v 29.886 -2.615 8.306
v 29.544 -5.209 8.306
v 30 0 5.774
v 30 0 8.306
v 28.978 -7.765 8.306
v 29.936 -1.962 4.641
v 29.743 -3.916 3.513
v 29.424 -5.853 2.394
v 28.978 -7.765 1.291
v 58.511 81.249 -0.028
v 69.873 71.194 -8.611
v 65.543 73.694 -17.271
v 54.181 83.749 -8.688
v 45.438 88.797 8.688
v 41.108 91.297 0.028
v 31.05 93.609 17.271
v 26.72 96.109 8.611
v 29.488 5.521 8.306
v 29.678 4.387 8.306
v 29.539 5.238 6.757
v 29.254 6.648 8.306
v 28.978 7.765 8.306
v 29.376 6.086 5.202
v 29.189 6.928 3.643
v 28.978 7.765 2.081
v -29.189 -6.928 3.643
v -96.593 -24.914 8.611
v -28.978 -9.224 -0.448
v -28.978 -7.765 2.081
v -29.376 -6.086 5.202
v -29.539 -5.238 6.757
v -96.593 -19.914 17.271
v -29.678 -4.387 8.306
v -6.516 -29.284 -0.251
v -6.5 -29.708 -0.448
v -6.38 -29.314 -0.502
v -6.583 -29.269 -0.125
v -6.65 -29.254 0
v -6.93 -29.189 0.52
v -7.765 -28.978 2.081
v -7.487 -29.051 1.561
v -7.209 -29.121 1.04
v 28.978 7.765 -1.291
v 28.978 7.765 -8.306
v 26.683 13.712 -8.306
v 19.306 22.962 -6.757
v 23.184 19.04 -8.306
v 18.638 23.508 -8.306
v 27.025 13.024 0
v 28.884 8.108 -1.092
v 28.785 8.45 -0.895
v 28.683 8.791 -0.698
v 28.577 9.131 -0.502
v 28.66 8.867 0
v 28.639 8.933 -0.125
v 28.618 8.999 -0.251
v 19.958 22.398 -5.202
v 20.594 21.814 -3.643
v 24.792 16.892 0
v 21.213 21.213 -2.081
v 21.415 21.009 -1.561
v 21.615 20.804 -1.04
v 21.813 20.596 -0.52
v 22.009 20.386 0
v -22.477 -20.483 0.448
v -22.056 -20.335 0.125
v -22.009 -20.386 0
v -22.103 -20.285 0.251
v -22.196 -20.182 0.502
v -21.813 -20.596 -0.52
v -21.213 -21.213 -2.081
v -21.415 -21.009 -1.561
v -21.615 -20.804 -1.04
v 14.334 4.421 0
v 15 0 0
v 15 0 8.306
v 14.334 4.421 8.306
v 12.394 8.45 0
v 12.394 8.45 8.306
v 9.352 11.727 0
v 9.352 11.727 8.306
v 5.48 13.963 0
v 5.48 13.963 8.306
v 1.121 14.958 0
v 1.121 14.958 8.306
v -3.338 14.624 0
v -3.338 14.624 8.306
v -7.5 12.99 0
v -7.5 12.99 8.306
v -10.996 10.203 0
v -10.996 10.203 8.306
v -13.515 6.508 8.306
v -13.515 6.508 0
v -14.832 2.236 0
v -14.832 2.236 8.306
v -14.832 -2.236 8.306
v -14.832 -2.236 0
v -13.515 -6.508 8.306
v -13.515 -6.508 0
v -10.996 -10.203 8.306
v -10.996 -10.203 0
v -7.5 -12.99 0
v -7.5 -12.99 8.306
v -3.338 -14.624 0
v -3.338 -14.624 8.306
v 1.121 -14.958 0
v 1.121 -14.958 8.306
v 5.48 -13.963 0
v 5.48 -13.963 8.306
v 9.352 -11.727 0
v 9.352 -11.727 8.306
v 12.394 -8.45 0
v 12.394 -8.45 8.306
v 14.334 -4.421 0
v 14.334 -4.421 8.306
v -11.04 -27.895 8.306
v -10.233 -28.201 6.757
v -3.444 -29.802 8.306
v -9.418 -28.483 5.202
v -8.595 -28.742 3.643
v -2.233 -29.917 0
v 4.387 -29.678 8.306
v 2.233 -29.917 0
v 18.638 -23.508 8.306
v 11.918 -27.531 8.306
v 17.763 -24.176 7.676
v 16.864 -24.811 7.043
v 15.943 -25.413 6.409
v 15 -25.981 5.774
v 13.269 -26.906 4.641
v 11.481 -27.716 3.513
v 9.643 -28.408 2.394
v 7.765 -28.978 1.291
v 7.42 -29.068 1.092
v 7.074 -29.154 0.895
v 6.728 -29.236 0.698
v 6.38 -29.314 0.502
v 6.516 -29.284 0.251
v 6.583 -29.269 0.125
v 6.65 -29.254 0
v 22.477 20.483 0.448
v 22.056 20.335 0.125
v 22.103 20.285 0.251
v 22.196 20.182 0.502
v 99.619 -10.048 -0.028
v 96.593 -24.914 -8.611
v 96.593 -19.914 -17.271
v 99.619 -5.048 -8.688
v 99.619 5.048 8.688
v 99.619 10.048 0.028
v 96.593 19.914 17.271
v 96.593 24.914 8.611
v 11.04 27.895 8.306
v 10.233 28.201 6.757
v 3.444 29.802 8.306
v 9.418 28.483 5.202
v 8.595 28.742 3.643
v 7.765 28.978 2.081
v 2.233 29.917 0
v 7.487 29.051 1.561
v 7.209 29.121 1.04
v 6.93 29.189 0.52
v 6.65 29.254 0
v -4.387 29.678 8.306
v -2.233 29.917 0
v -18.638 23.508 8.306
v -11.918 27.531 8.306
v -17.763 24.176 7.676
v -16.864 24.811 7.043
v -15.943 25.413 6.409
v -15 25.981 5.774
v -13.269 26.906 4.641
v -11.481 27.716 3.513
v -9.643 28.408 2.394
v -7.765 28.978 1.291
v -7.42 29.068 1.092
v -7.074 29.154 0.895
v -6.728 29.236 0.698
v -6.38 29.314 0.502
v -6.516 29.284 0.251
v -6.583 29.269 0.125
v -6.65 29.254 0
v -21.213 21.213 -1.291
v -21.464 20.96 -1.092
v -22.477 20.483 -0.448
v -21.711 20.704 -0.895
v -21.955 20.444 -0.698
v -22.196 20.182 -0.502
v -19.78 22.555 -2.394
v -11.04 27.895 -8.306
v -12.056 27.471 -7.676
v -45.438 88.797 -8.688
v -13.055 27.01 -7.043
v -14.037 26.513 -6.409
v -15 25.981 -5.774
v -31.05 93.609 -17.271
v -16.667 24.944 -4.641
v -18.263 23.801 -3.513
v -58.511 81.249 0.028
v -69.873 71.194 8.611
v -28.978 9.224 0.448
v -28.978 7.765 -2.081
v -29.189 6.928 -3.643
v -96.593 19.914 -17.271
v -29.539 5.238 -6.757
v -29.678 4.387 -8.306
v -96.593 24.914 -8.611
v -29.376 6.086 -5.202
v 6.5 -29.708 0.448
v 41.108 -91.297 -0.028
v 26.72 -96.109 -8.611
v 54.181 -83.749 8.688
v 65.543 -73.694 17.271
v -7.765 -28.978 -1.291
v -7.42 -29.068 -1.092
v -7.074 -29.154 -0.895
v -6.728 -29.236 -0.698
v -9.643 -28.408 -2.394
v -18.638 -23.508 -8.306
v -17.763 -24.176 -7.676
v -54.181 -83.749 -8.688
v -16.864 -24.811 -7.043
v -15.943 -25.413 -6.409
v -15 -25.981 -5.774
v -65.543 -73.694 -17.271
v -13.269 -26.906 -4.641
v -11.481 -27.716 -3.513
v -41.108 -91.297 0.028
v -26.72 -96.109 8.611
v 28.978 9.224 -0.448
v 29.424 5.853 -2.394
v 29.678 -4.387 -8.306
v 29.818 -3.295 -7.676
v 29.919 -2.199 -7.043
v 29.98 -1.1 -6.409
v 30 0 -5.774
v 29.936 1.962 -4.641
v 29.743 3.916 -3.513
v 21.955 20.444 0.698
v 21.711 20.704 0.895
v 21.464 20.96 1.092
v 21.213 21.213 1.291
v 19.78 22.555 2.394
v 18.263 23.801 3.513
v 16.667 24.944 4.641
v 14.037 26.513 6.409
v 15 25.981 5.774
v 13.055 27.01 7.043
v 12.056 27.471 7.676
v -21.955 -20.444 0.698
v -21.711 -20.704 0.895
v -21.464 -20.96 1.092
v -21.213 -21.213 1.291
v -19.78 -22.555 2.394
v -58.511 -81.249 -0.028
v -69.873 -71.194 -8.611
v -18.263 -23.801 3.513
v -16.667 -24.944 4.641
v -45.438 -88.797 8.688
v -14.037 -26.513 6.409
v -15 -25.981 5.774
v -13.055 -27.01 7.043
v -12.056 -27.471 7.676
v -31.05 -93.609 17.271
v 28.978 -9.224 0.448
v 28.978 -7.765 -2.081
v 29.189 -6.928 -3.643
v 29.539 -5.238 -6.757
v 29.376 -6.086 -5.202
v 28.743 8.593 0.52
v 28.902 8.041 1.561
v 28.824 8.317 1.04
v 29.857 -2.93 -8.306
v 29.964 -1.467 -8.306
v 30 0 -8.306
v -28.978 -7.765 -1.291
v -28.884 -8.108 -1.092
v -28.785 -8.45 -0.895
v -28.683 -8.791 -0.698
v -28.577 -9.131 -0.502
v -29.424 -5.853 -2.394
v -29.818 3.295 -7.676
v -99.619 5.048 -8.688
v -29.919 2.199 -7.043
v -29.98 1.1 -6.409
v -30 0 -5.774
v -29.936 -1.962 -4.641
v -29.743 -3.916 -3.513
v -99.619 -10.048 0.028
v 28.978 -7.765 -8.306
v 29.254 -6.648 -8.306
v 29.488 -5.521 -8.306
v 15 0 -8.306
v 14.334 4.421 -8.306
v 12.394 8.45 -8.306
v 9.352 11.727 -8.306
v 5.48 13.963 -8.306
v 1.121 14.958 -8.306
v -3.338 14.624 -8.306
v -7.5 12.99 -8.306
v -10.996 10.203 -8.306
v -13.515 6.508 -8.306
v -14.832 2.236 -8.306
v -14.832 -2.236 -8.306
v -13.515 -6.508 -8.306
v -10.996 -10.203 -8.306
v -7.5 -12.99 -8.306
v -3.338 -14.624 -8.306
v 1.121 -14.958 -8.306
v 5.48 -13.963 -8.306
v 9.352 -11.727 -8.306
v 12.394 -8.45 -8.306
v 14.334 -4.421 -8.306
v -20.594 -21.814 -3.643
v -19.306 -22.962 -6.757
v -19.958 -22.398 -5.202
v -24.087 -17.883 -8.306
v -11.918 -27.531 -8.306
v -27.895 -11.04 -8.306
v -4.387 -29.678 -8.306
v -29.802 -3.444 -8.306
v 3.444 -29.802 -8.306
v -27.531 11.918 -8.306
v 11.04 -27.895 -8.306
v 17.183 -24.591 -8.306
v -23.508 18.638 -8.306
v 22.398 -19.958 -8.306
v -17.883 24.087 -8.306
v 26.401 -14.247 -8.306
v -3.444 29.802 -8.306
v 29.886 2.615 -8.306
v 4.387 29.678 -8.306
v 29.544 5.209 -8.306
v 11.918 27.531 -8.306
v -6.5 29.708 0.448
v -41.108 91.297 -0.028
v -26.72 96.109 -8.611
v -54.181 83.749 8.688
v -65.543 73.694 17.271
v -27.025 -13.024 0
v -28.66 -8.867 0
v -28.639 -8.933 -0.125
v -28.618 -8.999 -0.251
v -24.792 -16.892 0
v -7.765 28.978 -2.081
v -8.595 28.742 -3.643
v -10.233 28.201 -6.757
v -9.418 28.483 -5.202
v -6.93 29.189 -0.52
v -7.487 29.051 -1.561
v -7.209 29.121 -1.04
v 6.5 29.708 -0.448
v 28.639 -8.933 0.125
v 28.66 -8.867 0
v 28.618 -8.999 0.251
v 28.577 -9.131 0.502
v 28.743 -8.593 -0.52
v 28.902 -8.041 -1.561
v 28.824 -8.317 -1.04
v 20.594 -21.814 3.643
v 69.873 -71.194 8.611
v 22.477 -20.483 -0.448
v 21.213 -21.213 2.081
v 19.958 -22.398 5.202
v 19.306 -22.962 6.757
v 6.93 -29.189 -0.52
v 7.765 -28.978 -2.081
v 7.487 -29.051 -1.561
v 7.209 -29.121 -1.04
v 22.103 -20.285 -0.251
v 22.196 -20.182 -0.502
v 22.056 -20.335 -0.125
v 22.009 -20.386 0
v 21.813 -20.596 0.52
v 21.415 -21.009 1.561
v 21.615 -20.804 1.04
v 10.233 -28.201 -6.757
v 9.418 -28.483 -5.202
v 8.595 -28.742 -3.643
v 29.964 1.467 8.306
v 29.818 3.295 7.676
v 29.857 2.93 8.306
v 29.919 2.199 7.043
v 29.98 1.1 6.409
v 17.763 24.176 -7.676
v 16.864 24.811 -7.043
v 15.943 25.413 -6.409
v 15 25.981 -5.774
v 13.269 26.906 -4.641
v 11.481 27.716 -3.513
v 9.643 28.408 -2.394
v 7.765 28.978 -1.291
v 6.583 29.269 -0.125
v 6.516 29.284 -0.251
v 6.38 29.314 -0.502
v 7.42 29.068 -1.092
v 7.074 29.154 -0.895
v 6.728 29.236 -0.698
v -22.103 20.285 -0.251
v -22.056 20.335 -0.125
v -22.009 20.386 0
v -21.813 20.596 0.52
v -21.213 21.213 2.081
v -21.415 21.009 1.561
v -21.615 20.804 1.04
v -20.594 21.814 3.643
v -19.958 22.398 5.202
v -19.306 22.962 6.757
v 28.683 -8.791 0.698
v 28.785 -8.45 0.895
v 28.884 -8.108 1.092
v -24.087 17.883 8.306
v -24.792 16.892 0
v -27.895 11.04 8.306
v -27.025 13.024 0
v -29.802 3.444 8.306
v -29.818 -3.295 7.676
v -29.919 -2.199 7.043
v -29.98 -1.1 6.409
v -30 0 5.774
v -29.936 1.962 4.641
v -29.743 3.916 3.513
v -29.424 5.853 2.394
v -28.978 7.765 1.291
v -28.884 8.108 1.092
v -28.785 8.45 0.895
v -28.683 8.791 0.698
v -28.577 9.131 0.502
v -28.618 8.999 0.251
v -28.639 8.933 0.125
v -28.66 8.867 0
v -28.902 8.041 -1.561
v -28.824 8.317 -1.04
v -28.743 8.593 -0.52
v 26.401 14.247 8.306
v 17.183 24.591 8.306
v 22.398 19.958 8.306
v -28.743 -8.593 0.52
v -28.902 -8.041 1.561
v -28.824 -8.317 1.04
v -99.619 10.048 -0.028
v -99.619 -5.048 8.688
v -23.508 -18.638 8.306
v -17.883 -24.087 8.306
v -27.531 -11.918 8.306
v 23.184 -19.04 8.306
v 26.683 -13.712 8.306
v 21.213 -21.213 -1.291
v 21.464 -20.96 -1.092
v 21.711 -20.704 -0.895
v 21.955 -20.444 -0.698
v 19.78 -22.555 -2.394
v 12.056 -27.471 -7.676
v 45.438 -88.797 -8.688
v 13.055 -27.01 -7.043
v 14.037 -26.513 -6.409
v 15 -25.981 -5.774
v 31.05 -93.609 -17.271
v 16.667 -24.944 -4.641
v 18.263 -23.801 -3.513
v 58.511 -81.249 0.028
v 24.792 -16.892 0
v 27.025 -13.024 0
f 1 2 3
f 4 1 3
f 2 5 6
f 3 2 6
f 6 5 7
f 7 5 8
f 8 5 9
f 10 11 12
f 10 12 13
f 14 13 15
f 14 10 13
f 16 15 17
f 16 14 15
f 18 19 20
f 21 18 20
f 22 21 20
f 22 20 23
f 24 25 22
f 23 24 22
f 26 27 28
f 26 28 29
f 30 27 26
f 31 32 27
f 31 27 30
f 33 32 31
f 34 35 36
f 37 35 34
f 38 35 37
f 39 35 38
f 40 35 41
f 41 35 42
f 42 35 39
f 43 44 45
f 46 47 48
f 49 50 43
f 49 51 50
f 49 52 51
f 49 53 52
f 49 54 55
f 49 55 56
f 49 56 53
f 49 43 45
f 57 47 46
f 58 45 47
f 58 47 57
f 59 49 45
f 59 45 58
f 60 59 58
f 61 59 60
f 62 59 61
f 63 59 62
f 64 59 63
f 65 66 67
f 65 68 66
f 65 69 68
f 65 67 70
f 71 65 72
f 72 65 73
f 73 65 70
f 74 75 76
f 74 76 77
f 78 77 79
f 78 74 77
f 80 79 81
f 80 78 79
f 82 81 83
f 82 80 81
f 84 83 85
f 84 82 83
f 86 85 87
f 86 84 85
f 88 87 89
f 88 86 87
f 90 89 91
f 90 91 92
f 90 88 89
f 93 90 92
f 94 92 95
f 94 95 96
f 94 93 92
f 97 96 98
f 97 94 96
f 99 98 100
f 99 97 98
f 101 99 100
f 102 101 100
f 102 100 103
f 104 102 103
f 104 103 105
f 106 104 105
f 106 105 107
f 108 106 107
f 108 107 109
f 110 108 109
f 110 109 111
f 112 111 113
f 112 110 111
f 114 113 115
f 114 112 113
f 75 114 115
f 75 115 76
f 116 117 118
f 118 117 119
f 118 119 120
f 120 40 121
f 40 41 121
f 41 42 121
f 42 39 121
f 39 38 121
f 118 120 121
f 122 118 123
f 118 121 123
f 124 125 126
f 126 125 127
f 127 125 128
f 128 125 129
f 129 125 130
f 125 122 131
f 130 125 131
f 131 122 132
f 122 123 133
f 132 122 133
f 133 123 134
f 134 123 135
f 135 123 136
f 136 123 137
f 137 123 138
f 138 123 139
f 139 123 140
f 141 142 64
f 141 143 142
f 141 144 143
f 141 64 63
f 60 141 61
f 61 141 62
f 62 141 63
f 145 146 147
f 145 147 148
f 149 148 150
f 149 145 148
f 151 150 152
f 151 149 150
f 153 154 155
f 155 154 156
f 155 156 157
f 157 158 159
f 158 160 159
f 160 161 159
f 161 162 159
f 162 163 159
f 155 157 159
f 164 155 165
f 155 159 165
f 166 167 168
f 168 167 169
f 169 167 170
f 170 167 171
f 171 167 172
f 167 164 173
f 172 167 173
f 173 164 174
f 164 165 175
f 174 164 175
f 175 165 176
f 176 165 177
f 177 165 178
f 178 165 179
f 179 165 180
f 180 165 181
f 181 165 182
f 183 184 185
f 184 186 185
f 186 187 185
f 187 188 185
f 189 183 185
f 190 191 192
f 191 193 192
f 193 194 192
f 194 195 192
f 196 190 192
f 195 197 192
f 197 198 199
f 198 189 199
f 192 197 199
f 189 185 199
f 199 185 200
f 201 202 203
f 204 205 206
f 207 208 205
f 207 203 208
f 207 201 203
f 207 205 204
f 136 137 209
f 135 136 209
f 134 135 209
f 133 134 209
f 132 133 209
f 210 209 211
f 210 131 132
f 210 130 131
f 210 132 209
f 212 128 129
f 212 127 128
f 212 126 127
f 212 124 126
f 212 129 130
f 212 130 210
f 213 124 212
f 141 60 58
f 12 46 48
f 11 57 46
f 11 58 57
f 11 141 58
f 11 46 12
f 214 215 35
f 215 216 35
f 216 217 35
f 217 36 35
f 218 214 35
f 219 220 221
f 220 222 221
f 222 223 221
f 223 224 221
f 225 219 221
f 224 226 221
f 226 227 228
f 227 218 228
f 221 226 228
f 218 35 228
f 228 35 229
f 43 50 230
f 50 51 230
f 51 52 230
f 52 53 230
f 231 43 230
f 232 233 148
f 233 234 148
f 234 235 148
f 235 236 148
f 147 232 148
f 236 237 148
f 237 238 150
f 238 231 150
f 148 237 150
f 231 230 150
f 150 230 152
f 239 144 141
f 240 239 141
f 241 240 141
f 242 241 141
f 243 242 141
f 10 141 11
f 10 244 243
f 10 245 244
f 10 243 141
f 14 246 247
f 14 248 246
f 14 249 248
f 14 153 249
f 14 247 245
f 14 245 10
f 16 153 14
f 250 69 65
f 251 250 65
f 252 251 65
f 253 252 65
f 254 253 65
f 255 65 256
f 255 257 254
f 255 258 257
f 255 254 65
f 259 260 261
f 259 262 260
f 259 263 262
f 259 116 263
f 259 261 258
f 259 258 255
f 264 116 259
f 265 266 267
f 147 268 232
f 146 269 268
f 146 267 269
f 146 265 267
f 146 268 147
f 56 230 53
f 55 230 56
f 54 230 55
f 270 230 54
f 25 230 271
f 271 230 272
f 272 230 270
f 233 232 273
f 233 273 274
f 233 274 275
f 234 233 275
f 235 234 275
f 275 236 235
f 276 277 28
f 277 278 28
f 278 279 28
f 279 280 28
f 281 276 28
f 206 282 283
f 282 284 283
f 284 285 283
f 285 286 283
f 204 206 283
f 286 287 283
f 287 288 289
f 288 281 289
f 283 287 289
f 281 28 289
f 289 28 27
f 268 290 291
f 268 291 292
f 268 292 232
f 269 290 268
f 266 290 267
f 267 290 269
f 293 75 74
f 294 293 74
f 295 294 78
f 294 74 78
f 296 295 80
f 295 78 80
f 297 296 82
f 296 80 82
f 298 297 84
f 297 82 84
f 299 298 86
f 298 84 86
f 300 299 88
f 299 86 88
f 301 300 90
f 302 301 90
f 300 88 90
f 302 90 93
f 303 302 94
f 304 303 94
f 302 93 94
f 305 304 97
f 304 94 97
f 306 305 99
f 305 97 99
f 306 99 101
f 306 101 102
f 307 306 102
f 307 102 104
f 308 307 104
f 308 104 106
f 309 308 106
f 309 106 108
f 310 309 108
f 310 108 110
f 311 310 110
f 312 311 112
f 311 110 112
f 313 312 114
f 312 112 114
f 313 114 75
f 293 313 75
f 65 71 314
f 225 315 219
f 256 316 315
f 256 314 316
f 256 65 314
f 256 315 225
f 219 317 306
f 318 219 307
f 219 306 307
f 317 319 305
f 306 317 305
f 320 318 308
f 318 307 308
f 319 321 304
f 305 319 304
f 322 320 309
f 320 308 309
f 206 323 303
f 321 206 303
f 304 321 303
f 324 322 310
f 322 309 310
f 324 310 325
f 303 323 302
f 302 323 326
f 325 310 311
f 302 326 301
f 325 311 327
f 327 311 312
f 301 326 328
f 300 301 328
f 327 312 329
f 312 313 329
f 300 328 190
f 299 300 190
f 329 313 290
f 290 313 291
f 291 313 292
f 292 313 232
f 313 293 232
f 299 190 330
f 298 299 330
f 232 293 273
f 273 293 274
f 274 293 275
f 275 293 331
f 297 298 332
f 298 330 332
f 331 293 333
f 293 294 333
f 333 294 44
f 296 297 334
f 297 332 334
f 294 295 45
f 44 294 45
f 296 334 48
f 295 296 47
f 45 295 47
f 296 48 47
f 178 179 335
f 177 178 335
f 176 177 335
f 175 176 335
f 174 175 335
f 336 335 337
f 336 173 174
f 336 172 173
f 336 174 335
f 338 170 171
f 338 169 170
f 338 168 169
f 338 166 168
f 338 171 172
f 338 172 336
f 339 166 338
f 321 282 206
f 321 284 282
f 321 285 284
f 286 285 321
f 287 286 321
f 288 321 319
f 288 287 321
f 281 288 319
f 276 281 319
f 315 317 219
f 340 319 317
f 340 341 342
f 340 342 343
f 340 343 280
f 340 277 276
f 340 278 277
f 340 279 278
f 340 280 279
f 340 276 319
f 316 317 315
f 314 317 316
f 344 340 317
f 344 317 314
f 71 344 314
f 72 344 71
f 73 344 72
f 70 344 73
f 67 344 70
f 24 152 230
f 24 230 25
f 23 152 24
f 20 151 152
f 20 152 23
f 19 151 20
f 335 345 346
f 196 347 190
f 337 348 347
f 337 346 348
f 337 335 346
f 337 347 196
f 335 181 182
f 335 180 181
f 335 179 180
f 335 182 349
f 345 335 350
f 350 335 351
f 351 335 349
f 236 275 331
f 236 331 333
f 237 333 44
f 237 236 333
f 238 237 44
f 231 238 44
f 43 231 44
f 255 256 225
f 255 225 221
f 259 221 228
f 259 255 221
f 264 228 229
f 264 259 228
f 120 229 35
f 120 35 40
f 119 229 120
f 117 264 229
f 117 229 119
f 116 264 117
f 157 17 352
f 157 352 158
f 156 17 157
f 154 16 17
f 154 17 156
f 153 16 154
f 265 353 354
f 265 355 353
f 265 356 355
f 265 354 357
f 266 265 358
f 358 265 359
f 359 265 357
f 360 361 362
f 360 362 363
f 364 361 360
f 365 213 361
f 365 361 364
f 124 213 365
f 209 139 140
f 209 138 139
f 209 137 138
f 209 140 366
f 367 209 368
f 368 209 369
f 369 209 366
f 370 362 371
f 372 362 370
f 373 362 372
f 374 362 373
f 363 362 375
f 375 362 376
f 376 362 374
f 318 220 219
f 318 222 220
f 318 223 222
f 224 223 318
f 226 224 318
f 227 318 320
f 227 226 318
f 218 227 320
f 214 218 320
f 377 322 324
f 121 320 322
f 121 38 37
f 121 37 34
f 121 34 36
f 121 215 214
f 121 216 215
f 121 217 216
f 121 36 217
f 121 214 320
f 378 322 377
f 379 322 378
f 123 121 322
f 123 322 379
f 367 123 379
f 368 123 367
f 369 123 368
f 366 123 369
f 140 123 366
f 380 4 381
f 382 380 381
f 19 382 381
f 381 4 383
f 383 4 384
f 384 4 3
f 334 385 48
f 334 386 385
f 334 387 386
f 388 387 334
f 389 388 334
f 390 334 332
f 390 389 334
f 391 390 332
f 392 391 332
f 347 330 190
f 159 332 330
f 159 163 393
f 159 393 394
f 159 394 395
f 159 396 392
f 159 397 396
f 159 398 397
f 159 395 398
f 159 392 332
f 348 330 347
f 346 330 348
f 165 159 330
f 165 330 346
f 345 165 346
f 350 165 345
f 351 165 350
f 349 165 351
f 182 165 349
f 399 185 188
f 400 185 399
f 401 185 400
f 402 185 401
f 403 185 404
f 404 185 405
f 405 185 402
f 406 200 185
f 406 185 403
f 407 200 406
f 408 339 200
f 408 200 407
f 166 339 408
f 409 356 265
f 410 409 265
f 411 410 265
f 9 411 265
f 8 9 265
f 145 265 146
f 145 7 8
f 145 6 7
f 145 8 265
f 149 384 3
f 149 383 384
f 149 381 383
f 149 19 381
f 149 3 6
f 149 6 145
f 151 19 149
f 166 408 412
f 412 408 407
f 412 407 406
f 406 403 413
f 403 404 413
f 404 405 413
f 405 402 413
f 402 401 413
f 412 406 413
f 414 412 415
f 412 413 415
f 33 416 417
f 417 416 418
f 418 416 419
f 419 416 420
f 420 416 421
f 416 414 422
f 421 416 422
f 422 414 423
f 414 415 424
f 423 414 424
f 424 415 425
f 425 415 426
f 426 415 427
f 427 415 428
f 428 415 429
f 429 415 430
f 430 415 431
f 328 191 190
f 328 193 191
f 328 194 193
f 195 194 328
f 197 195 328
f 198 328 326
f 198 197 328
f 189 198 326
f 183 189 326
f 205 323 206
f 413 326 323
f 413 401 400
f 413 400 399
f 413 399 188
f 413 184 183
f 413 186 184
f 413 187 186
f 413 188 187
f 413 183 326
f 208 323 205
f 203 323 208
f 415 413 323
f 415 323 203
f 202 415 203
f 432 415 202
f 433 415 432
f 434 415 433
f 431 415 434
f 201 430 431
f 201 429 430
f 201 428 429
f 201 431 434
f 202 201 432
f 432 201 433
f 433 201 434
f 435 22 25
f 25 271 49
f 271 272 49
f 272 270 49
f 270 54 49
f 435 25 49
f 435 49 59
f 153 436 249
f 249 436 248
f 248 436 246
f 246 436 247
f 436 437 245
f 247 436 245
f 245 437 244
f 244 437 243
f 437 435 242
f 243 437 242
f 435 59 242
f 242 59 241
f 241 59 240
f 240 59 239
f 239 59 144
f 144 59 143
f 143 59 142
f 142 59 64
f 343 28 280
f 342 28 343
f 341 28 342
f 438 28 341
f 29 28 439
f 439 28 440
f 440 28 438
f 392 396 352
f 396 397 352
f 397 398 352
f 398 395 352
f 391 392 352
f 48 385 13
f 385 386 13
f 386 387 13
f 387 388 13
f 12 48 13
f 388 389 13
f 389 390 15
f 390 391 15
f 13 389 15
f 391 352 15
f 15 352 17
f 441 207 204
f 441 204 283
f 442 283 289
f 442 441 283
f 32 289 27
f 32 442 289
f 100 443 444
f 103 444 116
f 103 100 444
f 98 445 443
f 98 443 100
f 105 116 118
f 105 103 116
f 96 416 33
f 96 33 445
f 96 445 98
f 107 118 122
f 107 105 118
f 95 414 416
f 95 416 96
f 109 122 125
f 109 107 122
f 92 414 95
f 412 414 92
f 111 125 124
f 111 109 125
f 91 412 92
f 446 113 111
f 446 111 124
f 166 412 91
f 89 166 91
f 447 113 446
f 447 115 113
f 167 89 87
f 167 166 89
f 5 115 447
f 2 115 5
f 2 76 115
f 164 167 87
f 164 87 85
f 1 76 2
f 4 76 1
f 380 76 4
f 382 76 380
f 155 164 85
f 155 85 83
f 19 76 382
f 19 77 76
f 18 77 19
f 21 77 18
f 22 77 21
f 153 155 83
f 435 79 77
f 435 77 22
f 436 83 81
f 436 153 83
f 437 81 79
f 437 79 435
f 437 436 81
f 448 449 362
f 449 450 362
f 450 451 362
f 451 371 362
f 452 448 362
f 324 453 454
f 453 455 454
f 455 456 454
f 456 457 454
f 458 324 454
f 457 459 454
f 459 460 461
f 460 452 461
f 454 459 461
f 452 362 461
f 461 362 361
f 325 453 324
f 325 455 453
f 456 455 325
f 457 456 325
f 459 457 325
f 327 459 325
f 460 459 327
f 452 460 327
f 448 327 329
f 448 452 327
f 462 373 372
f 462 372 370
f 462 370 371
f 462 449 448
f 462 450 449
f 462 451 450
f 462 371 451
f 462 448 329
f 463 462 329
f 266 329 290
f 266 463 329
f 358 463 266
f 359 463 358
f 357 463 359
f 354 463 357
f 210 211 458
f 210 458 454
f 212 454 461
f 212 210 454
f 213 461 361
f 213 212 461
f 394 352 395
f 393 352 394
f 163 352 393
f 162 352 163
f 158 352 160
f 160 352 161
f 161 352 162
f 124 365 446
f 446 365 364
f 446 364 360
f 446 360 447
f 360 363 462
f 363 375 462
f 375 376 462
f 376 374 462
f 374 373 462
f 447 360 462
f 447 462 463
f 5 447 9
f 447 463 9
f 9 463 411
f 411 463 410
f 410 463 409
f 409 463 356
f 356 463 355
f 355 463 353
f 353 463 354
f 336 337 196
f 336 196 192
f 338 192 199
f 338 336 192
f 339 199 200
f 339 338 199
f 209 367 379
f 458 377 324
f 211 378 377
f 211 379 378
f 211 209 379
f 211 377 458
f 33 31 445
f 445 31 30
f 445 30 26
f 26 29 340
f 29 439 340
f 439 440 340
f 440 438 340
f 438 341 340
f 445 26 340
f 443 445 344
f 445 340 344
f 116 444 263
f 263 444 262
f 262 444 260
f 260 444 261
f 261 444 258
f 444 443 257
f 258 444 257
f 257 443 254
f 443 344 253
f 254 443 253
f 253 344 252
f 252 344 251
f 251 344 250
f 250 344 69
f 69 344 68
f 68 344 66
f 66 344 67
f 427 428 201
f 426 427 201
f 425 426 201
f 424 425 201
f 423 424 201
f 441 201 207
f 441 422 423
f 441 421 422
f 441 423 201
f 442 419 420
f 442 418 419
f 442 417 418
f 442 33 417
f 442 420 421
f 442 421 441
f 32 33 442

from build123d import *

# Parameters (mm, degrees)
F1_DEPTH      = 5
F2_ANGLE      = 30
F0_R          = 15
F4_DEPTH      = 25
F4_DEPTH_BACK = 25
F5_COUNT      = 6
F6_DEPTH      = 8.3061645655
F6_DEPTH_BACK = 8.3061645655


with BuildPart() as f1:
    # F0 (on Top) → F1 (new body, symmetric)
    with BuildSketch(Plane.XY):
        with BuildLine():
            Line((28.9777747887, -7.7645713531), (96.5925826289, -25.8819045103))
            ThreePointArc((96.5925826289, -25.8819045103), (100, 0), (96.5925826289, 25.8819045103))
            Line((96.5925826289, 25.8819045103), (28.9777747887, 7.7645713531))
            ThreePointArc((28.9777747887, 7.7645713531), (29.7433458412, 3.9157857666), (30, 0))
            ThreePointArc((30, 0), (29.7433458412, -3.9157857666), (28.9777747887, -7.7645713531))
        make_face()
        with BuildLine():
            Line((23.4384574105, -6.280315735), (28.9777747887, -7.7645713531))
            ThreePointArc((28.9777747887, -7.7645713531), (29.7433458412, -3.9157857666), (30, 0))
            ThreePointArc((30, 0), (29.7433458412, 3.9157857666), (28.9777747887, 7.7645713531))
            Line((28.9777747887, 7.7645713531), (23.4384574105, 6.280315735))
            ThreePointArc((23.4384574105, 6.280315735), (24.2652766627, 0), (23.4384574105, -6.280315735))
        make_face()
    extrude(amount=F1_DEPTH, both=True)


with BuildPart() as f1_1:
    # F2: moved
    add(f1.part.rotate(Axis((53.4821525216, 0, 0), (1, 0, 0)), F2_ANGLE))

    # F0 (on Top) → F4 (cut, two sides)
    with BuildSketch(Plane.XY) as f4_sk:
        with BuildLine():
            ThreePointArc((28.9777747887, 7.7645713531), (-30, 0), (28.9777747887, -7.7645713531))
            Line((28.9777747887, -7.7645713531), (23.4384574105, -6.280315735))
            ThreePointArc((23.4384574105, -6.280315735), (24.2652766627, 0), (23.4384574105, 6.280315735))
            Line((23.4384574105, 6.280315735), (28.9777747887, 7.7645713531))
        make_face()
        Circle(F0_R, mode=Mode.SUBTRACT)
        with BuildLine():
            Line((23.4384574105, -6.280315735), (28.9777747887, -7.7645713531))
            ThreePointArc((28.9777747887, -7.7645713531), (29.7433458412, -3.9157857666), (30, 0))
            ThreePointArc((30, 0), (29.7433458412, 3.9157857666), (28.9777747887, 7.7645713531))
            Line((28.9777747887, 7.7645713531), (23.4384574105, 6.280315735))
            ThreePointArc((23.4384574105, 6.280315735), (24.2652766627, 0), (23.4384574105, -6.280315735))
        make_face()
    extrude(amount=-F4_DEPTH, mode=Mode.SUBTRACT)
    extrude(f4_sk.sketch, amount=F4_DEPTH_BACK, mode=Mode.SUBTRACT)


with BuildPart() as f5_1:
    # F5: instance of F1
    add(f1_1.part.rotate(Axis((0, 0, 24.5690848678), (0, 0, 1)), 1 * 360 / F5_COUNT))


with BuildPart() as f5_2:
    # F5: instance of F1
    add(f1_1.part.rotate(Axis((0, 0, 24.5690848678), (0, 0, 1)), 2 * 360 / F5_COUNT))


with BuildPart() as f5_3:
    # F5: instance of F1
    add(f1_1.part.rotate(Axis((0, 0, 24.5690848678), (0, 0, 1)), 3 * 360 / F5_COUNT))


with BuildPart() as f5_4:
    # F5: instance of F1
    add(f1_1.part.rotate(Axis((0, 0, 24.5690848678), (0, 0, 1)), 4 * 360 / F5_COUNT))


with BuildPart() as f5_5:
    # F5: instance of F1
    add(f1_1.part.rotate(Axis((0, 0, 24.5690848678), (0, 0, 1)), 5 * 360 / F5_COUNT))


with BuildPart() as f1_2:
    add(f1_1.part)

    add(f5_1.part)  # F6 merges F5_1

    add(f5_2.part)  # F6 merges F5_2

    add(f5_3.part)  # F6 merges F5_3

    add(f5_4.part)  # F6 merges F5_4

    add(f5_5.part)  # F6 merges F5_5
    # F0 (on Top) → F6 (join, two sides)
    with BuildSketch(Plane.XY) as f6_sk:
        with BuildLine():
            ThreePointArc((28.9777747887, 7.7645713531), (-30, 0), (28.9777747887, -7.7645713531))
            Line((28.9777747887, -7.7645713531), (23.4384574105, -6.280315735))
            ThreePointArc((23.4384574105, -6.280315735), (24.2652766627, 0), (23.4384574105, 6.280315735))
            Line((23.4384574105, 6.280315735), (28.9777747887, 7.7645713531))
        make_face()
        Circle(F0_R, mode=Mode.SUBTRACT)
        with BuildLine():
            Line((23.4384574105, -6.280315735), (28.9777747887, -7.7645713531))
            ThreePointArc((28.9777747887, -7.7645713531), (29.7433458412, -3.9157857666), (30, 0))
            ThreePointArc((30, 0), (29.7433458412, 3.9157857666), (28.9777747887, 7.7645713531))
            Line((28.9777747887, 7.7645713531), (23.4384574105, 6.280315735))
            ThreePointArc((23.4384574105, 6.280315735), (24.2652766627, 0), (23.4384574105, -6.280315735))
        make_face()
    extrude(amount=F6_DEPTH)
    extrude(f6_sk.sketch, amount=-F6_DEPTH_BACK)


solid = f1_2.part
